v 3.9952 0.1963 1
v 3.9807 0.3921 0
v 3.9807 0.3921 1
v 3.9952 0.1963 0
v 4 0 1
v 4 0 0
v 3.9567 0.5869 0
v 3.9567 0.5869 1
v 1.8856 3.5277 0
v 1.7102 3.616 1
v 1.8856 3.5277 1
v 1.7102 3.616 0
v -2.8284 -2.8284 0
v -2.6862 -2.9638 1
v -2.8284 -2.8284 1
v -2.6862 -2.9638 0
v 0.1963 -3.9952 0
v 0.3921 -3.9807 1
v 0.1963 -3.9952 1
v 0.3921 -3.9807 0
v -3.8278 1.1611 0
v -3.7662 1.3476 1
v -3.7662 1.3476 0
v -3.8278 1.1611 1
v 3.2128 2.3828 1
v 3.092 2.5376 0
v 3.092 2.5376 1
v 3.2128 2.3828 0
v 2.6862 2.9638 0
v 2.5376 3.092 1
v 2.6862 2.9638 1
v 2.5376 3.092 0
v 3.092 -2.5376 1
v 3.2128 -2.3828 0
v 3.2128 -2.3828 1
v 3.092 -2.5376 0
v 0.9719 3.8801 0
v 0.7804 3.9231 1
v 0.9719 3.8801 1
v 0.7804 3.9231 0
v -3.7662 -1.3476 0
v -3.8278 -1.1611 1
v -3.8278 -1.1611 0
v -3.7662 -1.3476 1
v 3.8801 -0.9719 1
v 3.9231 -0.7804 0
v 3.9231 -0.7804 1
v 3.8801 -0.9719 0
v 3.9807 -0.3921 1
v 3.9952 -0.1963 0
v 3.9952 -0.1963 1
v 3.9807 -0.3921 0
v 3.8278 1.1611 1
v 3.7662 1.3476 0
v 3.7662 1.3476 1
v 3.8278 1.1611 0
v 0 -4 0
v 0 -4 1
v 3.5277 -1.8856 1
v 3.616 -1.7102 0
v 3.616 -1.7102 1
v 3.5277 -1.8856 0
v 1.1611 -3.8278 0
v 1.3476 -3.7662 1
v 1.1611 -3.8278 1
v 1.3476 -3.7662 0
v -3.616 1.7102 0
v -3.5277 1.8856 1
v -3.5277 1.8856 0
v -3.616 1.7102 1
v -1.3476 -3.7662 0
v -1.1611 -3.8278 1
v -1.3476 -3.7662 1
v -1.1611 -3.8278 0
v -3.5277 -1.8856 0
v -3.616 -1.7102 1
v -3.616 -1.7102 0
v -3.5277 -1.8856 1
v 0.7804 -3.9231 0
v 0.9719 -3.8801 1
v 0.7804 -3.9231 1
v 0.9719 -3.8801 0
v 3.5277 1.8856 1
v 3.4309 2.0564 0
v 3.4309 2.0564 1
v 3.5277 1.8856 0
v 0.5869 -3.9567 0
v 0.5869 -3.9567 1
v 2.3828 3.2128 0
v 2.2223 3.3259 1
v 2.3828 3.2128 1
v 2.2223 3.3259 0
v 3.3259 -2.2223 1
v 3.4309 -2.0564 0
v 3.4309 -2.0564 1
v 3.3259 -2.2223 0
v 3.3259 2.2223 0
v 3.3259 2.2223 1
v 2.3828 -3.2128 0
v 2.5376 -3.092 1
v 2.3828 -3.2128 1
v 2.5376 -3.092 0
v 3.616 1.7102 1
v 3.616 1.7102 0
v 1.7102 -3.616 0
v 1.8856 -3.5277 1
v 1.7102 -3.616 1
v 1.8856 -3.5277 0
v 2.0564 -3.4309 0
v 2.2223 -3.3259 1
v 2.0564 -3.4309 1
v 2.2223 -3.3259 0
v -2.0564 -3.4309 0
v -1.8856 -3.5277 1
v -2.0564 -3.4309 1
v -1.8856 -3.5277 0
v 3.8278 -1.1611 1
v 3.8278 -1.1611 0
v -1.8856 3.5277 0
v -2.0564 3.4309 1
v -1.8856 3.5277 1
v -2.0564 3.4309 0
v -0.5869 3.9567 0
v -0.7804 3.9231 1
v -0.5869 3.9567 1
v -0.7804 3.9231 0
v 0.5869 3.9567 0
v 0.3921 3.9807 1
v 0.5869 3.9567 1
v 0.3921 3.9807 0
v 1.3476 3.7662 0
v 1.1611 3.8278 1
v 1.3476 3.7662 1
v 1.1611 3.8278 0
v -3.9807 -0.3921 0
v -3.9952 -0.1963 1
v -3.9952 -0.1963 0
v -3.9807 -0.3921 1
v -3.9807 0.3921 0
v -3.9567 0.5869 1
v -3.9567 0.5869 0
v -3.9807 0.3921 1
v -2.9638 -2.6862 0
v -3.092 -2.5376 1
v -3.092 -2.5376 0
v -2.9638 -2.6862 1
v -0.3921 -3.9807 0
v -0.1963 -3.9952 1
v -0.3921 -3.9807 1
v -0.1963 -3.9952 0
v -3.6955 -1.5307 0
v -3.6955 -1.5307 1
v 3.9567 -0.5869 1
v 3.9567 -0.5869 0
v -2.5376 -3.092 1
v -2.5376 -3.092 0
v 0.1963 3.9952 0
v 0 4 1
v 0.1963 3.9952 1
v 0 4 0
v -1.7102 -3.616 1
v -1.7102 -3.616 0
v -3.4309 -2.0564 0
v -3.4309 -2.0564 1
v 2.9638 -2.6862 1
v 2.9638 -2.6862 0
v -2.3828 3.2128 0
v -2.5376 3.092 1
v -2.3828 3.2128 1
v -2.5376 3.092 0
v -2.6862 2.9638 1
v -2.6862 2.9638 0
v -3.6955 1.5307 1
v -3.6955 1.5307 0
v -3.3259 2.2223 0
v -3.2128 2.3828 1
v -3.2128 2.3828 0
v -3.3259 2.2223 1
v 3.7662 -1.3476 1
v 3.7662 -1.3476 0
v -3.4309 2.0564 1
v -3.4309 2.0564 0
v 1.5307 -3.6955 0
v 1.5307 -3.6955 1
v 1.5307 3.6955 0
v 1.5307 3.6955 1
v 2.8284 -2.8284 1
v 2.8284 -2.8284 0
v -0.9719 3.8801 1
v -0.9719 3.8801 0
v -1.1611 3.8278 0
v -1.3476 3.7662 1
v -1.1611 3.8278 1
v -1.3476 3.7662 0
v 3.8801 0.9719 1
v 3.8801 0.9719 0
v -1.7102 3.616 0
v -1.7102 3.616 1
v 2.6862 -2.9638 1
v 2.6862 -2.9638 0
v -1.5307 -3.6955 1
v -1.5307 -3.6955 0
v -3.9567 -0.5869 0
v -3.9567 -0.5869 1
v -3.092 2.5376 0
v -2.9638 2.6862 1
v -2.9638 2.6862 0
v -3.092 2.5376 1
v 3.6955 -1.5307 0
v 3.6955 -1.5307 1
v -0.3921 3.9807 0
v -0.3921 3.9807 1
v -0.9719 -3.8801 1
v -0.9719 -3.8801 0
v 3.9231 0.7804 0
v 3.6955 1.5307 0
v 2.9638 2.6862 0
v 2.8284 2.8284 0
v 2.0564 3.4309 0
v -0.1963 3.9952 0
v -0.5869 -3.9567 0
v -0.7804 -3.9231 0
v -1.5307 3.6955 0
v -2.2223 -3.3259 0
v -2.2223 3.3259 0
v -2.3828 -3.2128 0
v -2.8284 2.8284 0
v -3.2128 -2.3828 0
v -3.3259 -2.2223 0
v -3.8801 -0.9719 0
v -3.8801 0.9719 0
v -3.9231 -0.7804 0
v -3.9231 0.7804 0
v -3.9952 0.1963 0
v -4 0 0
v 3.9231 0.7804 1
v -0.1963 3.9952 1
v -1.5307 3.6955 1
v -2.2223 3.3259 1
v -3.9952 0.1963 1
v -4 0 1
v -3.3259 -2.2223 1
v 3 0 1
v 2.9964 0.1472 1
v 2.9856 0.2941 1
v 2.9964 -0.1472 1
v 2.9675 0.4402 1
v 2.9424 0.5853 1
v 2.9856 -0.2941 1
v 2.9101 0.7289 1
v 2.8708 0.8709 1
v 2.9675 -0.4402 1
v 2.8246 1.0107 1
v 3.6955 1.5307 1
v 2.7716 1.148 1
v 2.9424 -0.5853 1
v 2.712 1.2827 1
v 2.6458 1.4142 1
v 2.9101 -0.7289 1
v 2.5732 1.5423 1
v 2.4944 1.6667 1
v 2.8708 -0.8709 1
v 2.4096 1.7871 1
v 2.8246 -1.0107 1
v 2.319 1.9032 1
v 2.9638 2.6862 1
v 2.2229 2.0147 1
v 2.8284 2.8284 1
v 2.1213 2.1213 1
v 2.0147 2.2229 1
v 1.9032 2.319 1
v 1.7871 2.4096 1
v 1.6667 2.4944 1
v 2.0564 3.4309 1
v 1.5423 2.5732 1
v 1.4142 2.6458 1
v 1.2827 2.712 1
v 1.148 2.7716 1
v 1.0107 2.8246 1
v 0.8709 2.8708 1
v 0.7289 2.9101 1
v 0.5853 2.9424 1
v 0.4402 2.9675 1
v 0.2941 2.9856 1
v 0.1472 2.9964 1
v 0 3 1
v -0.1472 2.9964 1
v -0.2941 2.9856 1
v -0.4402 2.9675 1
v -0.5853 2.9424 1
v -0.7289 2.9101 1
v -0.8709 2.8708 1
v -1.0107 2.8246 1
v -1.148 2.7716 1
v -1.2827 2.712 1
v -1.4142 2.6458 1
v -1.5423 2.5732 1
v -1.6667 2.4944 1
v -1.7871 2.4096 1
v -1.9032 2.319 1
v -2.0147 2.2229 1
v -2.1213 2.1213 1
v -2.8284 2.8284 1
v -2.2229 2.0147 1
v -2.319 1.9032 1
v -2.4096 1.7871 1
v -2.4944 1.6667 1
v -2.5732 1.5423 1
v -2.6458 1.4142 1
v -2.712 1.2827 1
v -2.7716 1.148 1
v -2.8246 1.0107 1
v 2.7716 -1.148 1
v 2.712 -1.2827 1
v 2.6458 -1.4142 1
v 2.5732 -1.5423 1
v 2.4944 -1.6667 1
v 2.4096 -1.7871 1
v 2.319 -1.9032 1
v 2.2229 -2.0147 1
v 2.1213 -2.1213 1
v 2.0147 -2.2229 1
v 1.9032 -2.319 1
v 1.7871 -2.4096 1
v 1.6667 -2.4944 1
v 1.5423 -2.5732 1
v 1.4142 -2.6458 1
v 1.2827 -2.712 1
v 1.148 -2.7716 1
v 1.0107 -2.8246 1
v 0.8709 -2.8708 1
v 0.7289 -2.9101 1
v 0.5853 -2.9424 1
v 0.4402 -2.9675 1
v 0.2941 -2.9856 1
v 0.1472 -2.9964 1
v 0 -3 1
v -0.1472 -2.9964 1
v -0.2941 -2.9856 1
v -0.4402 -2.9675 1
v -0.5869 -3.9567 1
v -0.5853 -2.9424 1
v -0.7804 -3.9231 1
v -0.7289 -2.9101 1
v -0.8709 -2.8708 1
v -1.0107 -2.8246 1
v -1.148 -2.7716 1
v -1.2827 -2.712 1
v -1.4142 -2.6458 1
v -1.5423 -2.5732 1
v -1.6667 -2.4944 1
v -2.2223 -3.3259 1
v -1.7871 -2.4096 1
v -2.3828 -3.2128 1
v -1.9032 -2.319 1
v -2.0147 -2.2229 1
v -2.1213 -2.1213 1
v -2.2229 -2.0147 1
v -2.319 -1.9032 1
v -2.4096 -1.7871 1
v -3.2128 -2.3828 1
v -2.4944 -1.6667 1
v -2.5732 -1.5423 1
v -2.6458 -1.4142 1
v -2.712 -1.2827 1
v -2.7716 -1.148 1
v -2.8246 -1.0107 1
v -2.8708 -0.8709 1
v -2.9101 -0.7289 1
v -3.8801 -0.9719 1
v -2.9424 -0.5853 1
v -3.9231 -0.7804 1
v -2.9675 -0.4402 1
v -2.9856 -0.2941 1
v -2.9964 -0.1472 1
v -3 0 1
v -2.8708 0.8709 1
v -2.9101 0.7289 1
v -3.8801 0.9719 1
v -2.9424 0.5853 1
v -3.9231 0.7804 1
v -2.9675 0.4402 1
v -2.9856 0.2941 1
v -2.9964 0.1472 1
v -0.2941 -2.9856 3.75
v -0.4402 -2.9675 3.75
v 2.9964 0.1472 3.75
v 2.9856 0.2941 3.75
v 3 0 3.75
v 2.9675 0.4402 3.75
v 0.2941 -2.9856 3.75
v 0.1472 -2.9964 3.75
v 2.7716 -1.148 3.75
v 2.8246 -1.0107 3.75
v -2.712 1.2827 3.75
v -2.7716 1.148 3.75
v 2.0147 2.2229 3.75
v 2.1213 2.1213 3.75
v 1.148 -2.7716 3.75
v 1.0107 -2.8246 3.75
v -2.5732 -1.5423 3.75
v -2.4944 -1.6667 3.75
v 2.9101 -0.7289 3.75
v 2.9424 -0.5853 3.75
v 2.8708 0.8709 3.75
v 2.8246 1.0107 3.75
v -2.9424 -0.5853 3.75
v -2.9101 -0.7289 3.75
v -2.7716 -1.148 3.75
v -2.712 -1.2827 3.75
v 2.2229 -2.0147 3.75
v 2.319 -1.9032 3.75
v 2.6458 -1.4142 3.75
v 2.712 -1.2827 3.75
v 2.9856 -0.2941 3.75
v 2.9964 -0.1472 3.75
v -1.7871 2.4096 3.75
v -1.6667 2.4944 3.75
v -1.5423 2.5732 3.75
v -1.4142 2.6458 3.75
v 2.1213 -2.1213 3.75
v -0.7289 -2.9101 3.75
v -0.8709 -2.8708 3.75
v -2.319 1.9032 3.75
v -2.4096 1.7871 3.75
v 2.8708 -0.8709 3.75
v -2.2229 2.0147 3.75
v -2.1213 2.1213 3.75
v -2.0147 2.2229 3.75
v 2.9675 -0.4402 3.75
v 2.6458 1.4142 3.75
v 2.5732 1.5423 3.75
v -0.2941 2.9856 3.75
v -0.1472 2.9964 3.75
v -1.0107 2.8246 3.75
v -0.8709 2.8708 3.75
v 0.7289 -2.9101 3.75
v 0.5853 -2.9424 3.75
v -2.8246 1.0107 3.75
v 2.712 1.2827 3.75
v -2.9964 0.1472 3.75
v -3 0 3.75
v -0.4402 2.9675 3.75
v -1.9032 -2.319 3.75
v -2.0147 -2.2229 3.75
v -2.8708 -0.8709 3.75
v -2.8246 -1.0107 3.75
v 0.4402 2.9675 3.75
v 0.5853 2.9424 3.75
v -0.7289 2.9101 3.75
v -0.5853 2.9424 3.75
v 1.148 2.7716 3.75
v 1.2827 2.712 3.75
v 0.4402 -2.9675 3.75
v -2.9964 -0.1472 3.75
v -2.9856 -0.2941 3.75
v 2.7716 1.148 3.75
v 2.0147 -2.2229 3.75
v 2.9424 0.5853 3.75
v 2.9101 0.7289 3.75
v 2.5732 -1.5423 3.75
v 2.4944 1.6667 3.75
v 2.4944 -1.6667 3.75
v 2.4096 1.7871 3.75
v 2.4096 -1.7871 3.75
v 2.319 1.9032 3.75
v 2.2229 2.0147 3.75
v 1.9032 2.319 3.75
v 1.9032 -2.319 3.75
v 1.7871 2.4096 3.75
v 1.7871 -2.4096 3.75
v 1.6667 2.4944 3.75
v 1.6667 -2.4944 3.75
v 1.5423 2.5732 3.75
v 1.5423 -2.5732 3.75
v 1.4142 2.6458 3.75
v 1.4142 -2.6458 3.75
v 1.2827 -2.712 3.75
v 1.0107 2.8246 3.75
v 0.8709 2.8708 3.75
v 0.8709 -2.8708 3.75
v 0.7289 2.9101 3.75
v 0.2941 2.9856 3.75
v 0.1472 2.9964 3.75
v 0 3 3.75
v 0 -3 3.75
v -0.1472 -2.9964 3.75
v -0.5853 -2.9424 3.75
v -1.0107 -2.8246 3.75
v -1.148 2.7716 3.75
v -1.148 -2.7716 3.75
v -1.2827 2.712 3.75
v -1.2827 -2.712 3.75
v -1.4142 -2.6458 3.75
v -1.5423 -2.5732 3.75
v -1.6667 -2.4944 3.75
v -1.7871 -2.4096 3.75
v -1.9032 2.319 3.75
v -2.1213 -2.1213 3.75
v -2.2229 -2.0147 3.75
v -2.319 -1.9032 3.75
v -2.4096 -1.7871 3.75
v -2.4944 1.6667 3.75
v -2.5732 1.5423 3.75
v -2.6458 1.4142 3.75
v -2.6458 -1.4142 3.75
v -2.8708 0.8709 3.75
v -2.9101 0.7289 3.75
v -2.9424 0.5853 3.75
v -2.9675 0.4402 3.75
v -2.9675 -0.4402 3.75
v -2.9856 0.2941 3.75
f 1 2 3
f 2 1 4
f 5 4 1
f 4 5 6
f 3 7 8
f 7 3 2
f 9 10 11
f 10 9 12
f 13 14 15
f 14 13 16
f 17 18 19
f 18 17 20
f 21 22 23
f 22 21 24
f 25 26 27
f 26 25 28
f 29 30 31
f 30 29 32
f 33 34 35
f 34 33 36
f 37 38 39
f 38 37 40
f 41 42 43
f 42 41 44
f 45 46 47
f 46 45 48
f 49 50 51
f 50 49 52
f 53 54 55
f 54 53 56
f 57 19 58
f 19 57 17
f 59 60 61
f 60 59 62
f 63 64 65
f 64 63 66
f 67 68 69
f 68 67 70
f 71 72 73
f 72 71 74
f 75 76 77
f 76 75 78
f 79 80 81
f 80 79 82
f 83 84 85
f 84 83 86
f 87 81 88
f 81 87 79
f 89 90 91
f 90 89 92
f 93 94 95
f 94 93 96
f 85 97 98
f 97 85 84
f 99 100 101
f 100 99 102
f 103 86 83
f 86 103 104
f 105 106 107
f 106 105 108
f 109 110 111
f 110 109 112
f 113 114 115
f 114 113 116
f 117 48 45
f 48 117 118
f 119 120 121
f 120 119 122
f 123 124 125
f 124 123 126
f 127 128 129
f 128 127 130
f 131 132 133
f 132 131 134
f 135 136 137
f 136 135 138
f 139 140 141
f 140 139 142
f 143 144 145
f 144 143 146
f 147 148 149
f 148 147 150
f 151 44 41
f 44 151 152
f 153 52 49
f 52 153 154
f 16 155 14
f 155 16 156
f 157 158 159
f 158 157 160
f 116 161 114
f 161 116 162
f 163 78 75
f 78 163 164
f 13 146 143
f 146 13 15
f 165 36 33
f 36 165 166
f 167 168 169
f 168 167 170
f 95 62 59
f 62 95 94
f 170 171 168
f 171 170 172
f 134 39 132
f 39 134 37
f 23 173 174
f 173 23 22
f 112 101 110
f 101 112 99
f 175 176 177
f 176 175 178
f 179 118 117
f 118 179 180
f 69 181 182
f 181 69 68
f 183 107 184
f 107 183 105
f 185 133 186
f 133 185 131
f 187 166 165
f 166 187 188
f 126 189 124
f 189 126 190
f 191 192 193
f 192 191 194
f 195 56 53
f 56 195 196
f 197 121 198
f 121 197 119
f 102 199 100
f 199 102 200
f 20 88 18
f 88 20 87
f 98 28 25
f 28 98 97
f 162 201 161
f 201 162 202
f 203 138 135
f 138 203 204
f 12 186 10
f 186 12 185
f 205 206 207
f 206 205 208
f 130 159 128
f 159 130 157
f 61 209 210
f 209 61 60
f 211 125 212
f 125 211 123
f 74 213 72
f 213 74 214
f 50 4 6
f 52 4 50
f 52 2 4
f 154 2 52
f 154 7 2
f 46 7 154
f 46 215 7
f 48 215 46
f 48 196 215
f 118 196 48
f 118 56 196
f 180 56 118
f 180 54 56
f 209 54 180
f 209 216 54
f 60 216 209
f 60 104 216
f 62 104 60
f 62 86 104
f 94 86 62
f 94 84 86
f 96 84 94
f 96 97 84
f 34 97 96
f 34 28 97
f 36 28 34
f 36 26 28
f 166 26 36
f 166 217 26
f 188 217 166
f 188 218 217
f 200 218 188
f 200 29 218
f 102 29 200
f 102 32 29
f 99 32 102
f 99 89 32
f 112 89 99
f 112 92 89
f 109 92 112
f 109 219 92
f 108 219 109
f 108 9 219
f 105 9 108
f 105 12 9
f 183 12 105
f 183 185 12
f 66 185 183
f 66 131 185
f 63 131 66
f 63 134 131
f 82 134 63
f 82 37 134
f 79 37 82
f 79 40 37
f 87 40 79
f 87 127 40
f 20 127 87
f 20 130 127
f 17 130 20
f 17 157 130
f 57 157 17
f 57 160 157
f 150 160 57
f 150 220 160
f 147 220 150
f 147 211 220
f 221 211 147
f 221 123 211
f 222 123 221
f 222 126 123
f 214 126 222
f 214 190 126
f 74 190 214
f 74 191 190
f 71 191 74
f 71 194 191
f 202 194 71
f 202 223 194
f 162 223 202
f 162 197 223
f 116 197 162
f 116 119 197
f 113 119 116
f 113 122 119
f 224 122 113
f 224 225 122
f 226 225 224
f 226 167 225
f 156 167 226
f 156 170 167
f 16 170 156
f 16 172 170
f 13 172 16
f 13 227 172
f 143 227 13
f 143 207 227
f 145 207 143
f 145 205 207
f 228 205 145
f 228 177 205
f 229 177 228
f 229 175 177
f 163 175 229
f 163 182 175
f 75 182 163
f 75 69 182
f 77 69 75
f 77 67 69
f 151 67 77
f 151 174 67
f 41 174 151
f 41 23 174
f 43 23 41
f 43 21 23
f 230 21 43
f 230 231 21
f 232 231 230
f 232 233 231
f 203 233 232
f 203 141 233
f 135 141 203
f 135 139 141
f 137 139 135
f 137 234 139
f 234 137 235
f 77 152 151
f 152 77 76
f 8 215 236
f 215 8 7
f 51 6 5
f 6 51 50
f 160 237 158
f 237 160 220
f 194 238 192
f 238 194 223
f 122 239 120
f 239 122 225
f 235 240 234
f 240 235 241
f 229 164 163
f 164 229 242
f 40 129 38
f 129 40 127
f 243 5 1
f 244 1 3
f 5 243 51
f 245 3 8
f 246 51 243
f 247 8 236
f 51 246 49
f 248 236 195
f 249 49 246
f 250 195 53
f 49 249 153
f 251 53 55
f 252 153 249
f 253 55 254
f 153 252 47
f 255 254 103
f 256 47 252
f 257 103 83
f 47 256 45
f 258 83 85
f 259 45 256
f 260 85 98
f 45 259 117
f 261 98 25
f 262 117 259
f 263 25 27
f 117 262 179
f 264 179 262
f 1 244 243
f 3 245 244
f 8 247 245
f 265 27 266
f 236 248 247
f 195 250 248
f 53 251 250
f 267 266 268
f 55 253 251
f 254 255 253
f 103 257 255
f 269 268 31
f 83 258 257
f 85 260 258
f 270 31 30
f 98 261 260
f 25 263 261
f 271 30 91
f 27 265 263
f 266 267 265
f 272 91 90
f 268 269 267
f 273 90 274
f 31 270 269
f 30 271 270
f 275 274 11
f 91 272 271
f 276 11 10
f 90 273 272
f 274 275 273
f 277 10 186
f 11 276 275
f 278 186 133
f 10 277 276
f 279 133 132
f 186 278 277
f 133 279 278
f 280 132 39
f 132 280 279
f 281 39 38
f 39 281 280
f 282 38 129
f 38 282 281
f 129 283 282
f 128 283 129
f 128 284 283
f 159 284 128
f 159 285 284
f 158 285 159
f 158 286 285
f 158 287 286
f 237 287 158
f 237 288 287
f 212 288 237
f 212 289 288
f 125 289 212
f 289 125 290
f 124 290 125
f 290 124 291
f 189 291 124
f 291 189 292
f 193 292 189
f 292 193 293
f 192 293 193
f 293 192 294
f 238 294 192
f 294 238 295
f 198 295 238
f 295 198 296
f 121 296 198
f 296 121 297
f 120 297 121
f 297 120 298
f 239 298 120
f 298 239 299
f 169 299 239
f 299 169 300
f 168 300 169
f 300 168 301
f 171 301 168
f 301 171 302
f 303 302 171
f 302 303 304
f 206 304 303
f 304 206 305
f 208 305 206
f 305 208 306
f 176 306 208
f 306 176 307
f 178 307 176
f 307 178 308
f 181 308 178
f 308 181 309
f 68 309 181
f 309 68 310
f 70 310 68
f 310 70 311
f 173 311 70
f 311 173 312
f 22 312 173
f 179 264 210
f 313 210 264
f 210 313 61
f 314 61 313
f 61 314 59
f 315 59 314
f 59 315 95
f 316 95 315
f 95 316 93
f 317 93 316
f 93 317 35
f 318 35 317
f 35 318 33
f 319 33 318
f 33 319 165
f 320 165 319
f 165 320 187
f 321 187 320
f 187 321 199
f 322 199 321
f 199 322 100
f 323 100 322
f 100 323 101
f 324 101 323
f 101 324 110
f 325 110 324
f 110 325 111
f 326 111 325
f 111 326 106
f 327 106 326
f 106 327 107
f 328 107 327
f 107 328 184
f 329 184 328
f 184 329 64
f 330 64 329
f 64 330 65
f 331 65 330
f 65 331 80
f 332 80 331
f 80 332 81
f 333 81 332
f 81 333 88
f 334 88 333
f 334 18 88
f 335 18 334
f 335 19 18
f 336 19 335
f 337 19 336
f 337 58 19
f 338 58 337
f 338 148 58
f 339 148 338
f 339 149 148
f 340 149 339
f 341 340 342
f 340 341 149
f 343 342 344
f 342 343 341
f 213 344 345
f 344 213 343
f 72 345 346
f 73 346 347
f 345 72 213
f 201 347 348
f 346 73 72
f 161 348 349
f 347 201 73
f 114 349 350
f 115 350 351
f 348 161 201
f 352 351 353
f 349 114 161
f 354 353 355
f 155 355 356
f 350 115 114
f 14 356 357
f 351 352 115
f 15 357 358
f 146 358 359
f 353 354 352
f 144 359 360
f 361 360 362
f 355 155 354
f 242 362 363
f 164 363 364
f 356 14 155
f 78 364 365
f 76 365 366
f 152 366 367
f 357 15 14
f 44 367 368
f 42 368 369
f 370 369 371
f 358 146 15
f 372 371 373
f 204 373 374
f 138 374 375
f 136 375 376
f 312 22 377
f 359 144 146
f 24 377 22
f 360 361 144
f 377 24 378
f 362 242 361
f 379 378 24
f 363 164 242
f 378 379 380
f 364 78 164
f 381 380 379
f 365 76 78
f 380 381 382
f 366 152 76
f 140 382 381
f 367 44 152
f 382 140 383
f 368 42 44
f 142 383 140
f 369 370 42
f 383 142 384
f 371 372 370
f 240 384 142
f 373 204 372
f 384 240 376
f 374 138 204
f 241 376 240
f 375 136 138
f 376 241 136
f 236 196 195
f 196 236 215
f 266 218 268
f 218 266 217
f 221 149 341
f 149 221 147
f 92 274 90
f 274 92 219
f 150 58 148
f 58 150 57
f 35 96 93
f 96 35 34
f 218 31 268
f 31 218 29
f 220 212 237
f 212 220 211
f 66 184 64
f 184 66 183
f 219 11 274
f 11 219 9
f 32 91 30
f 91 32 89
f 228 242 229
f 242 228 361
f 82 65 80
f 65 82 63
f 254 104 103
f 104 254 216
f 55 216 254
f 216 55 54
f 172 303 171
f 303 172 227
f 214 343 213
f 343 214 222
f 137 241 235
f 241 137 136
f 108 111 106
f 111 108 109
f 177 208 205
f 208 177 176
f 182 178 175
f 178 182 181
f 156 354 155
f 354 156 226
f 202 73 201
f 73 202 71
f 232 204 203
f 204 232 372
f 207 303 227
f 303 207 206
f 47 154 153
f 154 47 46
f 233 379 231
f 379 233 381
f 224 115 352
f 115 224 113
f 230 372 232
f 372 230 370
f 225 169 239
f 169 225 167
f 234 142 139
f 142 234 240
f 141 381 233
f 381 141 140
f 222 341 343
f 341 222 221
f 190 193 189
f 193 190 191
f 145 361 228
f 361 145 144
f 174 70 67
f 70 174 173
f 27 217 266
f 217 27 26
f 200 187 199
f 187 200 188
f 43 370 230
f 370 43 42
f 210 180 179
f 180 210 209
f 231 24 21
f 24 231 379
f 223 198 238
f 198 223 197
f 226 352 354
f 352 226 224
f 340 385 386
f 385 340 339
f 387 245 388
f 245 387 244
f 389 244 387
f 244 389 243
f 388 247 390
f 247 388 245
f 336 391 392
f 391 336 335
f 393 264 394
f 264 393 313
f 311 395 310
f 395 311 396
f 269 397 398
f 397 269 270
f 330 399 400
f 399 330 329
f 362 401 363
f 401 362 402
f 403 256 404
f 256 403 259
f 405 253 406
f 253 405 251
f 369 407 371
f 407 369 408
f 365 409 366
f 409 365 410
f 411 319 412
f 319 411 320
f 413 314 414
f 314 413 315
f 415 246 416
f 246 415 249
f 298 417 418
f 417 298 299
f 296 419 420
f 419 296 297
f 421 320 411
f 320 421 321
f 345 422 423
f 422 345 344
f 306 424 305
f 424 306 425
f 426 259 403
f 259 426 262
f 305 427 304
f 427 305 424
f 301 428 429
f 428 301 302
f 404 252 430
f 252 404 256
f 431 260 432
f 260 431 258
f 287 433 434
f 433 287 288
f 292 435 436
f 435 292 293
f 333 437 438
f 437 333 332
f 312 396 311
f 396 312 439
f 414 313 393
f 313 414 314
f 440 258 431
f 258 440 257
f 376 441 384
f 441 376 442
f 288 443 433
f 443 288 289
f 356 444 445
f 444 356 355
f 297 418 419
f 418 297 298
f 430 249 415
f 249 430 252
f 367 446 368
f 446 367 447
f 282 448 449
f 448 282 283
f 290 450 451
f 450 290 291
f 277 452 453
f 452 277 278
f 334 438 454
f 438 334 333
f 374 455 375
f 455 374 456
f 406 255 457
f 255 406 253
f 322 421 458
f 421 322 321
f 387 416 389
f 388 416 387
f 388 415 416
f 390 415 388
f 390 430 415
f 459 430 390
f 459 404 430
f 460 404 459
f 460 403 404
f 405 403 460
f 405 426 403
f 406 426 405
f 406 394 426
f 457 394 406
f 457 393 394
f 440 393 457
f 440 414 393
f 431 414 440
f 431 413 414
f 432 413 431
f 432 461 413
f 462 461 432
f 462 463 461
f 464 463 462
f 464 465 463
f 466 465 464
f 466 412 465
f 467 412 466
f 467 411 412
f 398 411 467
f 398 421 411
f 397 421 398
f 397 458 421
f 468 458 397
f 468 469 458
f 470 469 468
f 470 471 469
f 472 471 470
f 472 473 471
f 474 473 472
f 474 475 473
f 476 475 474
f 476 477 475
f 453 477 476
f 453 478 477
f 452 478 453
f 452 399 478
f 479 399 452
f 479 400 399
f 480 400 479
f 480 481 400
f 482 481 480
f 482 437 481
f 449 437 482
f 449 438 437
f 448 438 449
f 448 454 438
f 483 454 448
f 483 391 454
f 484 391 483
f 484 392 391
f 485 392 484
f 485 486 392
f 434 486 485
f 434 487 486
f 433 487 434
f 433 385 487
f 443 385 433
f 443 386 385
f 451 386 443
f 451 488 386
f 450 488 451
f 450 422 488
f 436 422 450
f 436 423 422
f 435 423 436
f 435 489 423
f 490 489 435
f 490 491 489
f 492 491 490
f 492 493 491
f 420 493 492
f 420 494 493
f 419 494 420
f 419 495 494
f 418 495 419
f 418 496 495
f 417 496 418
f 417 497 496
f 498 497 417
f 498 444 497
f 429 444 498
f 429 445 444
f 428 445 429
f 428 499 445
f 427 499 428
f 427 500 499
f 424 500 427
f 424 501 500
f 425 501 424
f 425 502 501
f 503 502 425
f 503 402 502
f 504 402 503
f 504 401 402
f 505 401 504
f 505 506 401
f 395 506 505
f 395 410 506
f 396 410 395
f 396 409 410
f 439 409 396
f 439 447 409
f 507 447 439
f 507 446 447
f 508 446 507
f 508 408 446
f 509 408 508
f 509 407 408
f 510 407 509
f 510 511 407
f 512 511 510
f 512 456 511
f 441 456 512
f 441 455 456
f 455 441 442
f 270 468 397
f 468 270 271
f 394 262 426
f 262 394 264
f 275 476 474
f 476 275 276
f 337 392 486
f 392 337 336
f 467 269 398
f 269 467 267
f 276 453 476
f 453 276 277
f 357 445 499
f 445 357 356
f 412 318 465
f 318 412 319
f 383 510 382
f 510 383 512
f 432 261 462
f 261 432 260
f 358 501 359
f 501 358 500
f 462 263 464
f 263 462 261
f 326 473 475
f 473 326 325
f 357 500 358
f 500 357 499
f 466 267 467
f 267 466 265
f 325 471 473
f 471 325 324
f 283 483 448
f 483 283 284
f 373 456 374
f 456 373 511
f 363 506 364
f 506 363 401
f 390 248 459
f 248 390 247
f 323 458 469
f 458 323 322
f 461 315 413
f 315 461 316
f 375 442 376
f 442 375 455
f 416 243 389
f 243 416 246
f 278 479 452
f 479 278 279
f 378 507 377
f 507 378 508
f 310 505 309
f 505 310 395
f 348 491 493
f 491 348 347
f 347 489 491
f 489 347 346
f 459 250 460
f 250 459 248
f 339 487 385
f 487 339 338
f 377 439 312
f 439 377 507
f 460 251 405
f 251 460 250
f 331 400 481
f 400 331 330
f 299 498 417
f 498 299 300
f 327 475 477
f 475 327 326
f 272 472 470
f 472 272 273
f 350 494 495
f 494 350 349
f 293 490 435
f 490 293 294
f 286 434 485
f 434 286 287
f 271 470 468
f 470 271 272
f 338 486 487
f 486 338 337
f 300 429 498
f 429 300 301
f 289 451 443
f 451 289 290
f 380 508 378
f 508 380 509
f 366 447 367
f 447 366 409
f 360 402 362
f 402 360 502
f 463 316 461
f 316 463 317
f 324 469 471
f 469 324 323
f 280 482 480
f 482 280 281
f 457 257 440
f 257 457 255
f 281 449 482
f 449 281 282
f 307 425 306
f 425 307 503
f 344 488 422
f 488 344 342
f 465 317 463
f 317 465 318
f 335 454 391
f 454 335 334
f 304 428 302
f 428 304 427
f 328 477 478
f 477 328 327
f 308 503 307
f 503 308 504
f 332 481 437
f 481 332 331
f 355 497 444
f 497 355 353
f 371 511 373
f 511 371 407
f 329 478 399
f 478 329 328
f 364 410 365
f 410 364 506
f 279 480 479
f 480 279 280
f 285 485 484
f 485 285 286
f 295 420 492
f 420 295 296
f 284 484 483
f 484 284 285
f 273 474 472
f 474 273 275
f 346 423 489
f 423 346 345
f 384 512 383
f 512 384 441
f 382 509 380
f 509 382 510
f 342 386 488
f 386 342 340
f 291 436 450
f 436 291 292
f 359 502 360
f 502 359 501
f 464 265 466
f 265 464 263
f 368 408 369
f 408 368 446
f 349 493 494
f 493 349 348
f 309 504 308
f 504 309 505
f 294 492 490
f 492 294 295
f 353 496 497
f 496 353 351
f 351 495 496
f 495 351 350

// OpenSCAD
// file: config.scad
$fn = $preview ? 32 : 128;
thread_fn = $preview ? 16 : 128;

INFTSML = 0.0000000000001;

NOTCH_COUNT = 0;
NOTCH_WIDTH = 2;
NOTCH_DEPTH = 2;

blower_inner_radius = 43.7 / 2;
blower_lip_width = 13.5;
blower_lip_depth = 3;
blower_inset_depth = 2.5;
blower_inset_radius = 35 / 2;
blower_lip_thickness = 2;
blower_middle_depth = 4;
blower_outer_radius = 49 / 2;
blower_upper_depth = 5;

slide_height = 25;
slide_thickness = 1.4;
slide_rails_depth = 2;
slide_rails_height = slide_rails_depth * 2;
slide_rails_width = slide_thickness + 0.6;
slide_mount_wall_thickness = slide_thickness * 3.5;
slide_mount_width = 38 + slide_mount_wall_thickness * 2;
slide_length = slide_mount_width;
slide_rails_length = slide_length * 1.01;
clip_depth = 2;
flue_taper_into_slit = 20; 
flue_floor_thickness = 5;
flue_slit_depth = 1;
flue_slit_offset = flue_slit_depth * 1.5;
flue_upper_height = 20;
flue_lip_length = flue_upper_height + 15;
flue_lip_thickness = 2;
flue_lip_breadth = slide_mount_width - slide_mount_wall_thickness;
flue_slit_length = flue_lip_breadth - slide_mount_wall_thickness;
flue_lip_rail_thickness = (slide_mount_width - flue_lip_breadth) / 2;
flue_lip_cutout_length = flue_lip_length / 2;
flue_lip_guard_thickness = 1;
flue_lip_y_offset = slide_mount_width / 2 - flue_slit_offset - flue_lip_thickness / 2;
flue_post_height = slide_height - 2 * slide_rails_depth;
slide_rails_offset = [flue_lip_breadth / 2 + slide_thickness / 2, slide_mount_wall_thickness - (slide_mount_width - slide_rails_length) / 2];

flue_middle_to_upper_inset_depth = flue_post_height / 2;
flue_middle_to_upper_inset_width = slide_mount_width / 3;
flue_middle_to_upper_inset_thickness = slide_mount_wall_thickness / 2;
flue_middle_to_upper_inset_offset = [0, -(slide_mount_width / 2 - flue_middle_to_upper_inset_thickness / 2)];


nut_depth = 2.3;
nut_width = 6;
bolt_radius = 3 / 2;

pipe_outer_radius = 41 / 2;
pipe_inner_radius = 37.5 / 2;
flue_taper_into_pipe = 20;
pipe_seat_depth = 15;
pipe_seat_thickness = 2;


window_post_width = 2;
window_post_height = slide_height + clip_depth;

thread_size = "M42";
thread_turns = 2;
thread_pitch = 4.5;

bench_mount_length = 25;
bench_mount_height = 25;
connection_depth = 1;
// main file
include <config.scad>

module bench_mount_plug() {
    head = 1;
    length = pipe_outer_radius - pipe_inner_radius + 1;
    cylinder(head, d=8);
    cylinder(length + head, d=6);
}
bench_mount_plug();
